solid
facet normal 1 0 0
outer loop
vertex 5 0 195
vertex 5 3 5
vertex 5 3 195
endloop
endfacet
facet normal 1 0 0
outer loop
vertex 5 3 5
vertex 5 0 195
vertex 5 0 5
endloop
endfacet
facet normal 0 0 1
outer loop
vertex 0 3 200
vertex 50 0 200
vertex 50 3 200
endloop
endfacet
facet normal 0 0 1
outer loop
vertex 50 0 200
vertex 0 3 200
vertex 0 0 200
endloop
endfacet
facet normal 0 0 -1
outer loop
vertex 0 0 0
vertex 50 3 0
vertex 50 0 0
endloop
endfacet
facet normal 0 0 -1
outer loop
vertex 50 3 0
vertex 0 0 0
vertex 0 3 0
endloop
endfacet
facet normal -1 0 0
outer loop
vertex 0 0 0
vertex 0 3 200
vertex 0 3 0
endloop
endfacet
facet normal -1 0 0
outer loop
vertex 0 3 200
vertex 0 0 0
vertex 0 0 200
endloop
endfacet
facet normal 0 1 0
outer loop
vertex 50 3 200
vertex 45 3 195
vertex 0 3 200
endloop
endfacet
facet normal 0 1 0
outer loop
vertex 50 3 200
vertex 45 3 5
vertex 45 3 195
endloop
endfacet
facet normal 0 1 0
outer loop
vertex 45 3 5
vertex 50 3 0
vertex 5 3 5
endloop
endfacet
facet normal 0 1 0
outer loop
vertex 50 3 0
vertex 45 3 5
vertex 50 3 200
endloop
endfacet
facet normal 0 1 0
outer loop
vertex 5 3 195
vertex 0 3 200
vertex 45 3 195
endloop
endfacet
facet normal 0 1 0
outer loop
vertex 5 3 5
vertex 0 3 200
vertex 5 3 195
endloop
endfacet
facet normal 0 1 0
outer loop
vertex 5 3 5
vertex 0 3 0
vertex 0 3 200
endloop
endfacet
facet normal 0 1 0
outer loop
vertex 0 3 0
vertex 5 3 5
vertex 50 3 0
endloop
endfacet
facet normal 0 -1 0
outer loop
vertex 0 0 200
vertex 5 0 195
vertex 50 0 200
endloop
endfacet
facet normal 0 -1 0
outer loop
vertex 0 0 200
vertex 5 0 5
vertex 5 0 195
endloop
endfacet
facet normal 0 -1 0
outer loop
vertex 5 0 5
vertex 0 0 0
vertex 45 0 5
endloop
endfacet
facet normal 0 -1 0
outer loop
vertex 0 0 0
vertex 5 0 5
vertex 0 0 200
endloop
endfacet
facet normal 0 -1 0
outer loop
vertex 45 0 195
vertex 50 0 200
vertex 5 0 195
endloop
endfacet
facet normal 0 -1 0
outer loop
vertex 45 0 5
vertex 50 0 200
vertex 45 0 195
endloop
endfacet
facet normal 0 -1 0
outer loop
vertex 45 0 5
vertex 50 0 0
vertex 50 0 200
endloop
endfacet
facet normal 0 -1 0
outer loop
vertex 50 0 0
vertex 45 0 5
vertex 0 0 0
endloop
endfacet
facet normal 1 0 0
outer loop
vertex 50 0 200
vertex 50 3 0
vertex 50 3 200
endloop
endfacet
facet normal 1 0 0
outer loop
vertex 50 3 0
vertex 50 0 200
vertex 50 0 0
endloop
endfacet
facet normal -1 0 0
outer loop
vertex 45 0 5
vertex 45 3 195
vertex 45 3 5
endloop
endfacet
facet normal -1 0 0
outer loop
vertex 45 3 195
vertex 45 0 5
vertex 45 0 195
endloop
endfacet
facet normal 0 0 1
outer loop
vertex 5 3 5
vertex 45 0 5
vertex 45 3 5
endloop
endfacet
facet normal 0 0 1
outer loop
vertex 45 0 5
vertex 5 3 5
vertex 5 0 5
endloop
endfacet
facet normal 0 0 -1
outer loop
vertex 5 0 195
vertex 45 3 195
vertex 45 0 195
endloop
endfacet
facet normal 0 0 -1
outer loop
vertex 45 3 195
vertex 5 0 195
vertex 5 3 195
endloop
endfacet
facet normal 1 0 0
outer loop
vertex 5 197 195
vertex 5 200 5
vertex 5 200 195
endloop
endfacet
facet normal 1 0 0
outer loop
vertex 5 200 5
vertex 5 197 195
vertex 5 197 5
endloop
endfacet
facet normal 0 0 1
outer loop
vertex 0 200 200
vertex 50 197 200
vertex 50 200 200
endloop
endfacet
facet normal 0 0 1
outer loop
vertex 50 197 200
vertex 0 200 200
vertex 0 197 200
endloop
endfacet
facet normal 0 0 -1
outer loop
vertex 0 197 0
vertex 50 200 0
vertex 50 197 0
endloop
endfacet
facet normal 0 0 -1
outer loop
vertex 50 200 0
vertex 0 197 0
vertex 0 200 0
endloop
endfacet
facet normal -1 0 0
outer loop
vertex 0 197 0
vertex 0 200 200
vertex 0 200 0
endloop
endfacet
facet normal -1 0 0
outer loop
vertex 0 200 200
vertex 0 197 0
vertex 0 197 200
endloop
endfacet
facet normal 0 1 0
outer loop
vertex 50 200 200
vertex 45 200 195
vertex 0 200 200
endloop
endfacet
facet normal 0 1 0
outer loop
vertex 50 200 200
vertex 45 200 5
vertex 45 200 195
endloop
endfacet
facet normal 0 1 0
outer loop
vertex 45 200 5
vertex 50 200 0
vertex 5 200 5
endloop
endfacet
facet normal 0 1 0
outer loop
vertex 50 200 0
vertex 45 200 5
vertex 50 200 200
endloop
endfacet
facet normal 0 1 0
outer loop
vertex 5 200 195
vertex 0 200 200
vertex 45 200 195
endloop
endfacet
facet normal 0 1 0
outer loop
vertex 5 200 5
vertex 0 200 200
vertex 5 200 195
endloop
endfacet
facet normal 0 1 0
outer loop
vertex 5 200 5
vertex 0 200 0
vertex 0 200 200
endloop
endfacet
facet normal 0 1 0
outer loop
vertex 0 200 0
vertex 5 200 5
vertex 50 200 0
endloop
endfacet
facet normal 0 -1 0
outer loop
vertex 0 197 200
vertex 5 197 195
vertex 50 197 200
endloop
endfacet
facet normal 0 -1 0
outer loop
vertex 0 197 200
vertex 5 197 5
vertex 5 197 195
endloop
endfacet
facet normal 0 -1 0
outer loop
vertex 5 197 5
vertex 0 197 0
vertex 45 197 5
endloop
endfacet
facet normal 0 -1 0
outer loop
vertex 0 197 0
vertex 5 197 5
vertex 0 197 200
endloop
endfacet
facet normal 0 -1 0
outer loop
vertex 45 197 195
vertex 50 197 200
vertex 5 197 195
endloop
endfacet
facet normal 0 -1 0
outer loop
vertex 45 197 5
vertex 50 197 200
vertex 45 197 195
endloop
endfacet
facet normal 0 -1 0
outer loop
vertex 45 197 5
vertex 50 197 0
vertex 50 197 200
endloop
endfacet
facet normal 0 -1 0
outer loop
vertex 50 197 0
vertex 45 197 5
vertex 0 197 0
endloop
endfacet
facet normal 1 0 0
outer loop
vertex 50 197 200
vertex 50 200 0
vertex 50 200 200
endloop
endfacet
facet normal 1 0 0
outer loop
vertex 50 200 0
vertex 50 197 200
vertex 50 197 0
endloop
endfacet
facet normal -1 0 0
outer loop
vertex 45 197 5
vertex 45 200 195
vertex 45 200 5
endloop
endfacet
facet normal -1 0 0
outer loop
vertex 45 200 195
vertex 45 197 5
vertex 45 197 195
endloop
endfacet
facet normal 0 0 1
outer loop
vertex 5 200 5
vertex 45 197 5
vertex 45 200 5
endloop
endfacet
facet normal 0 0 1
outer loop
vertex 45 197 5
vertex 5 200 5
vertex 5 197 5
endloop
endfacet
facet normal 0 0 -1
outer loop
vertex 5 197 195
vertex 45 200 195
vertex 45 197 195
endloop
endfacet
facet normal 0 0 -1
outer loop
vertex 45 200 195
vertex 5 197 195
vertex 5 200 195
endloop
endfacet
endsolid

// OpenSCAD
module gitter(){
  cube([]);
}

module seitenwand(){
  // Rahmen
  cube([5,3,200]);
  translate([45,0,0]) cube([5,3,200]);
  translate([5,0,0]) cube([40,3,5]);
  translate([5,0,195]) cube([40,3,5]);
  // Gitter
  
}


seitenwand();
translate([0, 197, 0]) seitenwand();
